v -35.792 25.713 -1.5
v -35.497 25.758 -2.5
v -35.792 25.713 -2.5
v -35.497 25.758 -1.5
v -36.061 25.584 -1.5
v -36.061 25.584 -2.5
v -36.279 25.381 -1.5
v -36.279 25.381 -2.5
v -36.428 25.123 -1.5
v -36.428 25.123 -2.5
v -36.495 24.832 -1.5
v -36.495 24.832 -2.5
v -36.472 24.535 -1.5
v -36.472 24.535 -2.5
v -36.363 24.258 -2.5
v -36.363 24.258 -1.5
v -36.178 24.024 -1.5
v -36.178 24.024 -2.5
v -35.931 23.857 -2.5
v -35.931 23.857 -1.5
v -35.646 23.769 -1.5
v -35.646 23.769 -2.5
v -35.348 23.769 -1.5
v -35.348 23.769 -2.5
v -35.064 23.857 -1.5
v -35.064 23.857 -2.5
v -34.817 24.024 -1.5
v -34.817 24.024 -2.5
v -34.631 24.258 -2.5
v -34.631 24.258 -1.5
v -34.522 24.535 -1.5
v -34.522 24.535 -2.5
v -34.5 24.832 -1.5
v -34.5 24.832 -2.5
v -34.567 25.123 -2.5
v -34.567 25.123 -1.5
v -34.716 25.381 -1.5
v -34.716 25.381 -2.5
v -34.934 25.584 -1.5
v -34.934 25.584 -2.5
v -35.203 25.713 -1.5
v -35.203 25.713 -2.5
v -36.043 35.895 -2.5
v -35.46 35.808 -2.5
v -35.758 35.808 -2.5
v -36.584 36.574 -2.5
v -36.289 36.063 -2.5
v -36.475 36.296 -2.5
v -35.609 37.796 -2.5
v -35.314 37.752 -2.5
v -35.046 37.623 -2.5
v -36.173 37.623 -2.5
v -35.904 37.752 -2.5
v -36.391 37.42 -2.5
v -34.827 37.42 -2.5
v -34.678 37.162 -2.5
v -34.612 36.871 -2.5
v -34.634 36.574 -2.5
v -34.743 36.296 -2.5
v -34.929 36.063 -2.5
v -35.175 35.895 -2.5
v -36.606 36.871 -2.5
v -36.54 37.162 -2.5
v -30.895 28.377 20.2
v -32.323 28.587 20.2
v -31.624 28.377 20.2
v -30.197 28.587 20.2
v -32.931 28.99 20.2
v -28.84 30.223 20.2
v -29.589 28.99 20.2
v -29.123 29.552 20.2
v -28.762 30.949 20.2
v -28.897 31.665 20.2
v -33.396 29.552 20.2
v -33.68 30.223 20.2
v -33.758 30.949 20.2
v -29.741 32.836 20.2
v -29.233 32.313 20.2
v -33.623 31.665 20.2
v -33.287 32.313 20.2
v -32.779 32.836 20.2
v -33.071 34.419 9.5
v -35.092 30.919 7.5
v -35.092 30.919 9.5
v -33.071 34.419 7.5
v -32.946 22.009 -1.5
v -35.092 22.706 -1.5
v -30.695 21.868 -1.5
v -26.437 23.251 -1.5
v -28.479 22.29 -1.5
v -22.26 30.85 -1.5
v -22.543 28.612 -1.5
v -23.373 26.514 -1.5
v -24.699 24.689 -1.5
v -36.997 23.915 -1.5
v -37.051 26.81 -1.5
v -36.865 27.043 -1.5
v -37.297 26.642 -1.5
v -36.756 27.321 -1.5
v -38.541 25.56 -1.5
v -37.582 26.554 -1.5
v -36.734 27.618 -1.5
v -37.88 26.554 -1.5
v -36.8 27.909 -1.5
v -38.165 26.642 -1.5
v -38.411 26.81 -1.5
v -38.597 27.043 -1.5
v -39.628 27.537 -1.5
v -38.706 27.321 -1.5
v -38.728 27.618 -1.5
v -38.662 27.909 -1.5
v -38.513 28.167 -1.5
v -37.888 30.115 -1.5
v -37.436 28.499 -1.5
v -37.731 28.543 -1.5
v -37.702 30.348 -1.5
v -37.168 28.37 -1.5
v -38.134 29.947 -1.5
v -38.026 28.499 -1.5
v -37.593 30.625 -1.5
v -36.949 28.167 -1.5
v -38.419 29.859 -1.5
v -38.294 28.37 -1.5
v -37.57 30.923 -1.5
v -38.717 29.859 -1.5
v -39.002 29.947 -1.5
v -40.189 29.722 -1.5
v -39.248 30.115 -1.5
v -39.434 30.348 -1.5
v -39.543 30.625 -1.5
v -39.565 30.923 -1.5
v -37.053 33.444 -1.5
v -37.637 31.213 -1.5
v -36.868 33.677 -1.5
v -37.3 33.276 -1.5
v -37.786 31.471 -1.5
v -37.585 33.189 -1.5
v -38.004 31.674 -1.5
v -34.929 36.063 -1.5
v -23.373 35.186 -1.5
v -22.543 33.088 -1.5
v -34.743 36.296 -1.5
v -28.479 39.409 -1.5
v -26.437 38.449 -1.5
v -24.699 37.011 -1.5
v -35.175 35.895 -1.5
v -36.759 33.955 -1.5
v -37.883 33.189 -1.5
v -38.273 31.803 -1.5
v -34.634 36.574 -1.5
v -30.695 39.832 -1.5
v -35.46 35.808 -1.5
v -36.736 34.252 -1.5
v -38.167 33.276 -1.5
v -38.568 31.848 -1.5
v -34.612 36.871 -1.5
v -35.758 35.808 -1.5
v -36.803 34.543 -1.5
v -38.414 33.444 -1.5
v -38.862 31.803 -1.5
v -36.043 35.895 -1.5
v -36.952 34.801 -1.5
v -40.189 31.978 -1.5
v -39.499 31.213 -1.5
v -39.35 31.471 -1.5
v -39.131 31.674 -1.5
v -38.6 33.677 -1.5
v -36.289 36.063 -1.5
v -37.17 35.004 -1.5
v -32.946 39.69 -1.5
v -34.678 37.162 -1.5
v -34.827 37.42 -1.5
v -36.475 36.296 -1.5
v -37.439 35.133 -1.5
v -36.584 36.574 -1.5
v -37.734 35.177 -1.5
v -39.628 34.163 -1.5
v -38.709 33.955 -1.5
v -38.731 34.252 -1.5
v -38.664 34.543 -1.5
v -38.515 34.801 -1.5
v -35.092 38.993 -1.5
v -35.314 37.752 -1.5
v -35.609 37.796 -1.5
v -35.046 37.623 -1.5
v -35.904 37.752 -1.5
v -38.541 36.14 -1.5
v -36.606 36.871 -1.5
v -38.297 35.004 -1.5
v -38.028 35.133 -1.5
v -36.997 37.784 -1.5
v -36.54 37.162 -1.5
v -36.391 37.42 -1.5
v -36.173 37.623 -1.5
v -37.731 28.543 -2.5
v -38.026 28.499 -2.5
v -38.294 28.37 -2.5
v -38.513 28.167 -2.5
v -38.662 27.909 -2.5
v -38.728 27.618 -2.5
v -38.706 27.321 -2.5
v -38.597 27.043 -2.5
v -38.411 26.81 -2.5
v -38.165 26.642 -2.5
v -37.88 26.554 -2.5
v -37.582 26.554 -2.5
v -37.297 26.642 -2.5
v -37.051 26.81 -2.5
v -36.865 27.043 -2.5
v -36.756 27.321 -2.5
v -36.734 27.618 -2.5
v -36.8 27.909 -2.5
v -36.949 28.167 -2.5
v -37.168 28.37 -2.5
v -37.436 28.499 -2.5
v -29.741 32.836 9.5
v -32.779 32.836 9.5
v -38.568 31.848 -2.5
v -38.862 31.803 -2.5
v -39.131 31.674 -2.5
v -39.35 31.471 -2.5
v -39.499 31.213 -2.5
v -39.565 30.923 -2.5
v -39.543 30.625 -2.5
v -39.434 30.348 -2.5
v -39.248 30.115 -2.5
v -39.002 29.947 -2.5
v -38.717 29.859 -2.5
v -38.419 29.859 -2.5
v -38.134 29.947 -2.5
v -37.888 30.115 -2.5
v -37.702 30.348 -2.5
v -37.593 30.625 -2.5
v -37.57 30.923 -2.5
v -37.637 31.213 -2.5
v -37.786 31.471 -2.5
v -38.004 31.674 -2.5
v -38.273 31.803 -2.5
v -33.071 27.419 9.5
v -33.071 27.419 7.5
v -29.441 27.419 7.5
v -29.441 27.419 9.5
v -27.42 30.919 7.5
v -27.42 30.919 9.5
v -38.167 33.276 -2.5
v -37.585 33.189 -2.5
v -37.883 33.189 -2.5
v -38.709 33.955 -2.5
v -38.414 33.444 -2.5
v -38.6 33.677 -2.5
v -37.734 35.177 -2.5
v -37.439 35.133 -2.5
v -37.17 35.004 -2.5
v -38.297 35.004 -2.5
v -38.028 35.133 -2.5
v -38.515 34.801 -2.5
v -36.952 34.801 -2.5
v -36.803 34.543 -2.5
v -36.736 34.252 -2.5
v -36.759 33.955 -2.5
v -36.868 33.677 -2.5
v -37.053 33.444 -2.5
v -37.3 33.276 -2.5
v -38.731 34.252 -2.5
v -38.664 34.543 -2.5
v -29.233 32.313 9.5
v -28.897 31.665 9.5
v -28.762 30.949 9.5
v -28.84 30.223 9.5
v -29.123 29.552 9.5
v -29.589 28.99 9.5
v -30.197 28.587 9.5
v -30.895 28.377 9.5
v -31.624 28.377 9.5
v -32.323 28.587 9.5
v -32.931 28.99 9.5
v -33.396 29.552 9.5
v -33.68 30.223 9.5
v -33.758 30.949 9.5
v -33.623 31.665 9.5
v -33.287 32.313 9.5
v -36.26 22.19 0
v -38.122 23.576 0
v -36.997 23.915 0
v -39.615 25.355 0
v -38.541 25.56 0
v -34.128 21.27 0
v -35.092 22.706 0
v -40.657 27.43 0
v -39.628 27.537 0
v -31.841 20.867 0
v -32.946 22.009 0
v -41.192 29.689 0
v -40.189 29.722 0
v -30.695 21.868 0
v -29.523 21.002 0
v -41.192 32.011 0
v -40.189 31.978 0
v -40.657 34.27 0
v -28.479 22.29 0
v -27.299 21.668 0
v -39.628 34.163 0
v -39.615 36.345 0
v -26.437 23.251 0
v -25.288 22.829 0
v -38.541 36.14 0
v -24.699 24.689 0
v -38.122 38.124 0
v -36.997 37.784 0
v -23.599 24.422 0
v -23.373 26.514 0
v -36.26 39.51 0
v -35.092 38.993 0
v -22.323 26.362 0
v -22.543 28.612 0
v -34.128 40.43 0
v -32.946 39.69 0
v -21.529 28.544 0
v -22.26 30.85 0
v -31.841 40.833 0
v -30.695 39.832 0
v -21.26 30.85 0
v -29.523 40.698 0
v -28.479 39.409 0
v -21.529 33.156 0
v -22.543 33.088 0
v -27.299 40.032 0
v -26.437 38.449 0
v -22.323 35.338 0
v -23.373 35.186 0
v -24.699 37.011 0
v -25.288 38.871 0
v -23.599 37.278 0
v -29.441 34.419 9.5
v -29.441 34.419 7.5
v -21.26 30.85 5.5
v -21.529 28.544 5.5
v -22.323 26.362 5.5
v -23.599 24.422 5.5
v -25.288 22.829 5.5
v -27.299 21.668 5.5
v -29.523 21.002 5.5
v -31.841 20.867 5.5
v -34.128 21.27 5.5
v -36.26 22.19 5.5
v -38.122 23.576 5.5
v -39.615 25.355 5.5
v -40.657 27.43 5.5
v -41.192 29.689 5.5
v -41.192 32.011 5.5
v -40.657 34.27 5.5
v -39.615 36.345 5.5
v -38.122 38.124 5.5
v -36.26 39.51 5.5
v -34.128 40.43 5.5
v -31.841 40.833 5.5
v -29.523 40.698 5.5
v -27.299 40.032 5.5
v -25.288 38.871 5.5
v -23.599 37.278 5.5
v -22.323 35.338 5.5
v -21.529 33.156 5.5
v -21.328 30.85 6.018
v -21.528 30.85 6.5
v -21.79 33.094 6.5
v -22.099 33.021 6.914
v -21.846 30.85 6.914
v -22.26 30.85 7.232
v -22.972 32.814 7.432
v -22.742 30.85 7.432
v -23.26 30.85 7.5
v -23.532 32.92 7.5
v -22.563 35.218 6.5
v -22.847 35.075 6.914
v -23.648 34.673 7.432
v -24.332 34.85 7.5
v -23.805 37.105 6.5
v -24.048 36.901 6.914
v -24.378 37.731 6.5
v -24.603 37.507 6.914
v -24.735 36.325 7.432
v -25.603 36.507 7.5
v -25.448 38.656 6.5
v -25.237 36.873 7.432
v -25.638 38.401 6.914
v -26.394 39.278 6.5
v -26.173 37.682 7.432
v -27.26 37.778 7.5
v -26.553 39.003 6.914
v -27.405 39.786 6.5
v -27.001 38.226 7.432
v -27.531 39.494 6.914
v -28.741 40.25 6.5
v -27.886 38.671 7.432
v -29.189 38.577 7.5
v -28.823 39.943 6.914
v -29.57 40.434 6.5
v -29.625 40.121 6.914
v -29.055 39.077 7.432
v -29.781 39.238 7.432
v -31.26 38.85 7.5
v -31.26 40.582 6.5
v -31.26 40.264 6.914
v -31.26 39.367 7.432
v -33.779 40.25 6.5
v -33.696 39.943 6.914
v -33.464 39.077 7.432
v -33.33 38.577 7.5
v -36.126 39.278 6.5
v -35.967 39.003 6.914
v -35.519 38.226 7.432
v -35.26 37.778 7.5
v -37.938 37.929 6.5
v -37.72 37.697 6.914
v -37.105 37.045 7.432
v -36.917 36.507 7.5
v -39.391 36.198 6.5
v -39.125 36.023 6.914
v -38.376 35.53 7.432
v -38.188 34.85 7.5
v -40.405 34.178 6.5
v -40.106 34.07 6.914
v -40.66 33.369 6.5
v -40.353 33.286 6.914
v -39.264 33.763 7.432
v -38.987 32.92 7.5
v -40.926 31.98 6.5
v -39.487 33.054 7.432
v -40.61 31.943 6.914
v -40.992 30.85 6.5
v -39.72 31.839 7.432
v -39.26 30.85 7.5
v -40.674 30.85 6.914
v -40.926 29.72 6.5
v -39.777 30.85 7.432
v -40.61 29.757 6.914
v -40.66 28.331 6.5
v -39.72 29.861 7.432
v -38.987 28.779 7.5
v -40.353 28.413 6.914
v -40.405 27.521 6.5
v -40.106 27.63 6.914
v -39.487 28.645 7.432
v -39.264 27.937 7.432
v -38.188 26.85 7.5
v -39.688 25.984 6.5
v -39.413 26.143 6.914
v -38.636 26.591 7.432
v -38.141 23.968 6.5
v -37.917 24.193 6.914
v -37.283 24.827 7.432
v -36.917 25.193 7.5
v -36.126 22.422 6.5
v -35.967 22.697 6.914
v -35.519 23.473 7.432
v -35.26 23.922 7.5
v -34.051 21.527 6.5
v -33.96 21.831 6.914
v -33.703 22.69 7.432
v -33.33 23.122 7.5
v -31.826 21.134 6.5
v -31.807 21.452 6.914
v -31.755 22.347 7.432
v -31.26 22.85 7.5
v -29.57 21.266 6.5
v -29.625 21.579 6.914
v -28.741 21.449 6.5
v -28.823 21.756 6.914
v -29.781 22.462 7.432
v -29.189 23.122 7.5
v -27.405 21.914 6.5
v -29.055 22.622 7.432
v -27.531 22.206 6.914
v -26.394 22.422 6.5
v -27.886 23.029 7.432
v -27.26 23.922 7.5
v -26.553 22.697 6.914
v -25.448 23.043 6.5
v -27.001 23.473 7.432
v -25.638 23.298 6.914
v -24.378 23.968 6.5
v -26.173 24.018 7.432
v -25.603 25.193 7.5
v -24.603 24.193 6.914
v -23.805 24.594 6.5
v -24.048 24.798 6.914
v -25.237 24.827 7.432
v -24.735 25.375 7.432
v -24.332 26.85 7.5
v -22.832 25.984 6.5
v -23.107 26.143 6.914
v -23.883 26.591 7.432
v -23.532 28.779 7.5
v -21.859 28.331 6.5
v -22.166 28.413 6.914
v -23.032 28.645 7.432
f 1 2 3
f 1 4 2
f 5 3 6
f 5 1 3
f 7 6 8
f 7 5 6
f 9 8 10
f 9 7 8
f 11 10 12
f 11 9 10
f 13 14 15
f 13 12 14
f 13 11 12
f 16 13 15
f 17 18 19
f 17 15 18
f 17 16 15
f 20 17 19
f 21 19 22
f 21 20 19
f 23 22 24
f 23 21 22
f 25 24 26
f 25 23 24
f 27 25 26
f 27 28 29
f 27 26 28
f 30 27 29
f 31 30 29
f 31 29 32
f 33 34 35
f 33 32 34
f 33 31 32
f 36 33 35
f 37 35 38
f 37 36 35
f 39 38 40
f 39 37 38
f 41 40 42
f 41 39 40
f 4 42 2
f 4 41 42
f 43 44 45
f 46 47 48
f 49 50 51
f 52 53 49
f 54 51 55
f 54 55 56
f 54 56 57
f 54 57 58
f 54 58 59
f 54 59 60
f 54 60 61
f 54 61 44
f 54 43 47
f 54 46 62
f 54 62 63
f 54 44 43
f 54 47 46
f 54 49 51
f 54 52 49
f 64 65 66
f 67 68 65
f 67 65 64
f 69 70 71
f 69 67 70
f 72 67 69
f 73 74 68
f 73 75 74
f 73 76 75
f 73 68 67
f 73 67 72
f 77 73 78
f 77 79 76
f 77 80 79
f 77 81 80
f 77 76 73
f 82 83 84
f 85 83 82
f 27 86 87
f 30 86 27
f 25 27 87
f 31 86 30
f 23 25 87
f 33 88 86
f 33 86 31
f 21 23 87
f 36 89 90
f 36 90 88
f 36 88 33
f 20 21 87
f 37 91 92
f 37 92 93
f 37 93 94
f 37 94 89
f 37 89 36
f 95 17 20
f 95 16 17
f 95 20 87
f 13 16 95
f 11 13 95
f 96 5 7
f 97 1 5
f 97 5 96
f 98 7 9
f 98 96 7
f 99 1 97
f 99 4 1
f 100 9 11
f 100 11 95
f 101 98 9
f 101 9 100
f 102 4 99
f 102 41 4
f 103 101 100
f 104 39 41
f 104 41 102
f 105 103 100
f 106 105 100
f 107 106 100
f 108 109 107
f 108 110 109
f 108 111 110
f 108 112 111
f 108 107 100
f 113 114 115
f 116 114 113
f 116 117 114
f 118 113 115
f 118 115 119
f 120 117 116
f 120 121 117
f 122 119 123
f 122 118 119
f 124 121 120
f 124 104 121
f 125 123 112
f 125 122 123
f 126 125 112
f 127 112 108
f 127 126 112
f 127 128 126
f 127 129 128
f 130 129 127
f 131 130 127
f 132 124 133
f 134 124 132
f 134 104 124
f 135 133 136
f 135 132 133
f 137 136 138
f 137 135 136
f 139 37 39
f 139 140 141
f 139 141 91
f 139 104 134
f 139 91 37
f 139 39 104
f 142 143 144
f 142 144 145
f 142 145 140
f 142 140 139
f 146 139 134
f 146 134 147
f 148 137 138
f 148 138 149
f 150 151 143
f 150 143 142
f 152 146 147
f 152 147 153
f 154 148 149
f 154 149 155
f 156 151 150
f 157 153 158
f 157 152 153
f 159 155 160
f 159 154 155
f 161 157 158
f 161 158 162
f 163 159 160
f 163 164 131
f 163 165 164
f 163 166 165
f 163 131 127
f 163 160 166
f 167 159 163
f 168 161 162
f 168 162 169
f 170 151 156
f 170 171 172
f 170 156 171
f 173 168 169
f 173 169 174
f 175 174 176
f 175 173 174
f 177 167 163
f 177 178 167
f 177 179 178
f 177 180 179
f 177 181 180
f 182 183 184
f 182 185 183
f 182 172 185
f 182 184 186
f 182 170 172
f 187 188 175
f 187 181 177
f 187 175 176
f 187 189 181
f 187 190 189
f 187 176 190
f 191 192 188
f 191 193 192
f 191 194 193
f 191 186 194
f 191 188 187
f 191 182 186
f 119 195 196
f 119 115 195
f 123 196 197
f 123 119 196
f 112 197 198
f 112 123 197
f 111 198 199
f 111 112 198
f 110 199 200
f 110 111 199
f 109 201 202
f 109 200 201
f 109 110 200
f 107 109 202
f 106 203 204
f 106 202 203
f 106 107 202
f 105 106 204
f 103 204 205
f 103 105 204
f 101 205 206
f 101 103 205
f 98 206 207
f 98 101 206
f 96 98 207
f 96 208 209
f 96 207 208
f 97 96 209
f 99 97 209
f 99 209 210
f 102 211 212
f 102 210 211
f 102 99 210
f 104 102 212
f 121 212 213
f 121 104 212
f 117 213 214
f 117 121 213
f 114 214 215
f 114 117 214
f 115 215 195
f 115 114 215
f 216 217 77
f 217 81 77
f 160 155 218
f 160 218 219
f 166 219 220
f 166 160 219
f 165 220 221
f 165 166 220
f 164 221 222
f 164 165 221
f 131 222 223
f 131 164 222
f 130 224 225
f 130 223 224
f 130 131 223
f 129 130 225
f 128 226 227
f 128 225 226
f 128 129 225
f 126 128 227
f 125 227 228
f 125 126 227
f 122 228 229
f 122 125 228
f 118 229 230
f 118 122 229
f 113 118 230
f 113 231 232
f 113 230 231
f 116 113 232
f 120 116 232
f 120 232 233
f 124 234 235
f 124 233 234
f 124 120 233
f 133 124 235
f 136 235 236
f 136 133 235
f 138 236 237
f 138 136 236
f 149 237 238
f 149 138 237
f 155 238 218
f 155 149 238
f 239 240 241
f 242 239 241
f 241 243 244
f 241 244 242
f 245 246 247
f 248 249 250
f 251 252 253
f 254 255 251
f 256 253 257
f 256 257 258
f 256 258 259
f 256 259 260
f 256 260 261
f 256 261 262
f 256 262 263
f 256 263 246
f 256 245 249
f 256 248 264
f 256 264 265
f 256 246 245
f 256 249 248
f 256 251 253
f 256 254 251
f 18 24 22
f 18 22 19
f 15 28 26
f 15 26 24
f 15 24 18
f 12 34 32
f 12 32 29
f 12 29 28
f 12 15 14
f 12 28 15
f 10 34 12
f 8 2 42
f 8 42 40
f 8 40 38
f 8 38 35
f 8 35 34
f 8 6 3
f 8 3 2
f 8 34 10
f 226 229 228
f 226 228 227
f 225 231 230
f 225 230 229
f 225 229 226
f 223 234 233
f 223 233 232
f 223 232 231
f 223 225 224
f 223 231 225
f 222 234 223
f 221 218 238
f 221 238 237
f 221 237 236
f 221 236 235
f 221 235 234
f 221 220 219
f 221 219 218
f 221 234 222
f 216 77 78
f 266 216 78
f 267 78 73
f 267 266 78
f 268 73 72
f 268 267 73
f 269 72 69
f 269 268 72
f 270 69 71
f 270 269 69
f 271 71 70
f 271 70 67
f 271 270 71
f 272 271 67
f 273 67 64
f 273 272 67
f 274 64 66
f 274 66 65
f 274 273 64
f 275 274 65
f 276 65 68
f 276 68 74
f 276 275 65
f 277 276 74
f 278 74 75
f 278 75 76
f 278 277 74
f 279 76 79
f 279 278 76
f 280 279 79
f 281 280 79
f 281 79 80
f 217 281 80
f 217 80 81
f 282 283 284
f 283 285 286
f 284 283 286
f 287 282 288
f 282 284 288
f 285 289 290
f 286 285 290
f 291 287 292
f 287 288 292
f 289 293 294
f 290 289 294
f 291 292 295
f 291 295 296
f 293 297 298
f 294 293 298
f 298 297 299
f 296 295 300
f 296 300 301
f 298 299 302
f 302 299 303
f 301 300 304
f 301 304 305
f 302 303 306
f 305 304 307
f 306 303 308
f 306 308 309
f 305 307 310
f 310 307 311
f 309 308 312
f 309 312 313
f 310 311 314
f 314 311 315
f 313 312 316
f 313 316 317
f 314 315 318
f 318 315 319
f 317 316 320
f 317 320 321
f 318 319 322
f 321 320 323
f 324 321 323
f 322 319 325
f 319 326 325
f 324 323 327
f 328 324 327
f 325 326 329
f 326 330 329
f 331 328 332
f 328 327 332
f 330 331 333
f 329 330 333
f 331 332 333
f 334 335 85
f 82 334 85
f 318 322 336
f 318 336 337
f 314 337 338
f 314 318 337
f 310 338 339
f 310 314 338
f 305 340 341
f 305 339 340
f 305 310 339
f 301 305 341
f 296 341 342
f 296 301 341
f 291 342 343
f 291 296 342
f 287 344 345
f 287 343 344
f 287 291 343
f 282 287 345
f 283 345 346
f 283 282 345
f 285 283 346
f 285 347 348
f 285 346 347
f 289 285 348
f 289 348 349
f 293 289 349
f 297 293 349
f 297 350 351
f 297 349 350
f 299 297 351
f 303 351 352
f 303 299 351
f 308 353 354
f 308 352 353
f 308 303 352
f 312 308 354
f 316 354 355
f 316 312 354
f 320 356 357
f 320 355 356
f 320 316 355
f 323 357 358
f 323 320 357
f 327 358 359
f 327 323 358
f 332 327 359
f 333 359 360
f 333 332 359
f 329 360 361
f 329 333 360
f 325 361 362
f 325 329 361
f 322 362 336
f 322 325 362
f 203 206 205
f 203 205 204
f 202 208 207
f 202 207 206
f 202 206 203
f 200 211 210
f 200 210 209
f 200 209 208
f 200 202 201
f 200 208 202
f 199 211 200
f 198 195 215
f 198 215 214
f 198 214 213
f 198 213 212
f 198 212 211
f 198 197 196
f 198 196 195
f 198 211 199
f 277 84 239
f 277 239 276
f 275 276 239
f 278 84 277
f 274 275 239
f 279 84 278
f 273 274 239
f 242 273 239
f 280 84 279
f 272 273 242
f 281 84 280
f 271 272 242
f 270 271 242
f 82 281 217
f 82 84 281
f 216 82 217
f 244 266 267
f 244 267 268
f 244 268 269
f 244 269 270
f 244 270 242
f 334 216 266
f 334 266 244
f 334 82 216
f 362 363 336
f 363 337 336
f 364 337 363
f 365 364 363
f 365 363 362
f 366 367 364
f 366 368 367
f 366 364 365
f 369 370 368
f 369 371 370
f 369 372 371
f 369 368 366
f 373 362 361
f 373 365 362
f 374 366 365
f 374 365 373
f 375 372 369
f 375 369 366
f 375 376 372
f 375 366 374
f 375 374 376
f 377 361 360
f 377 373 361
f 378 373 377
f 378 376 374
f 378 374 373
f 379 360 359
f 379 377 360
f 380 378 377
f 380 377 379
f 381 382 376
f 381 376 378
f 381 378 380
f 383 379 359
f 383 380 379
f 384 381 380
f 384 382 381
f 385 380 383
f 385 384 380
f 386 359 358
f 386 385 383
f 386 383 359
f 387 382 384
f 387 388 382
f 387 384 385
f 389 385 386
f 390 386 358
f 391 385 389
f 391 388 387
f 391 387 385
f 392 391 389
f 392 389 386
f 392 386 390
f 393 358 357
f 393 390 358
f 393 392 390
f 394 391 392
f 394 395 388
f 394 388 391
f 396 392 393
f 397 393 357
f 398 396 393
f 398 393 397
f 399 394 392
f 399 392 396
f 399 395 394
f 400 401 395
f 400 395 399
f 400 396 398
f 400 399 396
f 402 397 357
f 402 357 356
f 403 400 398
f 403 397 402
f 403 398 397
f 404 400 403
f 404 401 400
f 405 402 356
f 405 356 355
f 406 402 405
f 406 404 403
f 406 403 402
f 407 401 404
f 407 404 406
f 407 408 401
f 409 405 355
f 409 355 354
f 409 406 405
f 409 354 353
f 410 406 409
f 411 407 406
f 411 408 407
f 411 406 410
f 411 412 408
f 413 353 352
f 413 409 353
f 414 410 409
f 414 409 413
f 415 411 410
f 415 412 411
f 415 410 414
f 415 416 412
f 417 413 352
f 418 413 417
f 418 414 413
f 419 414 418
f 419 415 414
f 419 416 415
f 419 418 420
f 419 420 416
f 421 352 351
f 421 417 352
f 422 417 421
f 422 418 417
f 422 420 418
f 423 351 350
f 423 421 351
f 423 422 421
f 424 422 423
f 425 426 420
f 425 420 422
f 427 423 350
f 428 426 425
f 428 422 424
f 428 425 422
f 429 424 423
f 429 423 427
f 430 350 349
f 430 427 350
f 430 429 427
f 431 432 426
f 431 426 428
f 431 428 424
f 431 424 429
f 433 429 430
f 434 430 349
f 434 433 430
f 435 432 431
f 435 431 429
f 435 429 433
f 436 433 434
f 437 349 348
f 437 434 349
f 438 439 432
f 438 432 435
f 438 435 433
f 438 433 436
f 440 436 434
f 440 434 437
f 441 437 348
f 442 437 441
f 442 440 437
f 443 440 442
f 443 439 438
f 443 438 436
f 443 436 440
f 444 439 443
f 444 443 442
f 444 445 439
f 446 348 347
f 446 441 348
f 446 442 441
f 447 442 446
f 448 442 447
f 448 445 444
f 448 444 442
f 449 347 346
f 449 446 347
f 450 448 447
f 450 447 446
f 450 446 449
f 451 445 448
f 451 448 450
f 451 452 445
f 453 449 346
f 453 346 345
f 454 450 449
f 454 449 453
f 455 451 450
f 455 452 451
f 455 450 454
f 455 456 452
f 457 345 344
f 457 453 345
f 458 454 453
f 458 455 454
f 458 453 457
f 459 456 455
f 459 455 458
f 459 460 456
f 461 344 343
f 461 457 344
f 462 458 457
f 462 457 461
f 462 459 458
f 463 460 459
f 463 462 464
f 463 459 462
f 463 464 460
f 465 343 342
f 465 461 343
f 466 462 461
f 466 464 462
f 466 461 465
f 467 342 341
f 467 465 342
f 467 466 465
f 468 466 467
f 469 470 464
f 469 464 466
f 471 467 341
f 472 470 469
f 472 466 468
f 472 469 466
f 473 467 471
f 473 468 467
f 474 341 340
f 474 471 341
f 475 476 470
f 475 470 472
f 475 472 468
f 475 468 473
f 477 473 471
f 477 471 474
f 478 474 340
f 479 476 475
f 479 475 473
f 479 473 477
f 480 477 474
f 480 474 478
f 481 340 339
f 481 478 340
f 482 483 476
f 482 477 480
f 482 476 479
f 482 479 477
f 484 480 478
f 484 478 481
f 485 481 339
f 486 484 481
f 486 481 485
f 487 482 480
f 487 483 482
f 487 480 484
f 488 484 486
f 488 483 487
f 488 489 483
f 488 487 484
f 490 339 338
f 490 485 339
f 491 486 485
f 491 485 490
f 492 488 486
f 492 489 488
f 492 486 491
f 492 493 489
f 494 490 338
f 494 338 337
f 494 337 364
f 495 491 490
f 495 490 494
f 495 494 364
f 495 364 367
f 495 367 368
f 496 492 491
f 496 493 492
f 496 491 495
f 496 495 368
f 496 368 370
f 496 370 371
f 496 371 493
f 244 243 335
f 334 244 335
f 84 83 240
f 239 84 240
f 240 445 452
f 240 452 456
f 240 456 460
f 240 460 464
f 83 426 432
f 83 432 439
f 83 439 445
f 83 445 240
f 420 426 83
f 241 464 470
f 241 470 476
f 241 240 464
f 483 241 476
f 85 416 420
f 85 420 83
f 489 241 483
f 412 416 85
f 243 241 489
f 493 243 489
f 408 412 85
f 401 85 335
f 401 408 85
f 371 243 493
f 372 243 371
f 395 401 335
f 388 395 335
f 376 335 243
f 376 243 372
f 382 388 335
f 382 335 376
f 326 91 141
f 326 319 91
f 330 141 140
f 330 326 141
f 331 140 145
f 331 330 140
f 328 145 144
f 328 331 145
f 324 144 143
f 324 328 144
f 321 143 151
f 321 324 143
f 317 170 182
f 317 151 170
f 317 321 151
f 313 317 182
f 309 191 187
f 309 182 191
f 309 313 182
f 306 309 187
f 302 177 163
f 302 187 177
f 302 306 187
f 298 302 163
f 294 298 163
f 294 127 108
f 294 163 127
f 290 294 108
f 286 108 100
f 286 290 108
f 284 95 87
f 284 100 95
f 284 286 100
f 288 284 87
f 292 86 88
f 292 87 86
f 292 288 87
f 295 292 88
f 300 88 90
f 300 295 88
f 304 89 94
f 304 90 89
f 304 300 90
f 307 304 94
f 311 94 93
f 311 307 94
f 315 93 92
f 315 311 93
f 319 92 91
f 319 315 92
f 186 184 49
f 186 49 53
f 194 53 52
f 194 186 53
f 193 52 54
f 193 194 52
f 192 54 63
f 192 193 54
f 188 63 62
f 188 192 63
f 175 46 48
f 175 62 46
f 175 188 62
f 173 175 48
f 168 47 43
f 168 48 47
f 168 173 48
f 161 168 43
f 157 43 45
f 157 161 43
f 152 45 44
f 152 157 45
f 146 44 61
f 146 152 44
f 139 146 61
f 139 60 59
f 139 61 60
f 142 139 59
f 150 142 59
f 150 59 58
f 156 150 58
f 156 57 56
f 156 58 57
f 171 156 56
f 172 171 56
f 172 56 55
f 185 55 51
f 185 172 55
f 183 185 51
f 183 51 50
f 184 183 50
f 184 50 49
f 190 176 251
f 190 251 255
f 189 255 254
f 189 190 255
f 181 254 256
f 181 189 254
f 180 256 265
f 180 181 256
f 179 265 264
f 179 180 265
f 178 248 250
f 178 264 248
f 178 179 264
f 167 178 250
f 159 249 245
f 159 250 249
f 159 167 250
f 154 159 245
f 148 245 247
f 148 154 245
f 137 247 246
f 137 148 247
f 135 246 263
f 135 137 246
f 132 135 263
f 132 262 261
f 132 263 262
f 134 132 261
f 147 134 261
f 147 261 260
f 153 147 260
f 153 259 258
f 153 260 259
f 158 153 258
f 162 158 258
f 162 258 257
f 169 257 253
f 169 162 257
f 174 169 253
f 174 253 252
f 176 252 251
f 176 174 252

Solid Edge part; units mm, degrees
sketch "Sketch1" plane through (0, 0, 0) normal (0, 0, 1) x (1, 0, 0)
  circle A0 centre (-31.2598, 30.8498) radius 10
  dimension "D1" = 20
extrude "Protrusion1" add sketch "Sketch1" along normal blind 7.5
fillet "Round_1" radius 2 1 edges at (-41.2598, 30.8498, 7.5)
sketch "Sketch2" plane through (-31.2598, 30.8498, 0) normal (0, 0, -1) x (1, 0, 0)
  circle A0 centre (0, 0) radius 9
extrude "ExtrudedProtrusion_2" add sketch "Sketch2" along normal blind 1.5
sketch "Sketch3" plane through (-31.2598, 30.8498, 7.5) normal (0, 0, 1) x (1, 0, 0)
  circle A0 centre (0, 0) radius 2.5
  dimension "D1" = 5
extrude "ExtrudedProtrusion_3" add sketch "Sketch3" along normal blind 12.7
sketch "Sketch4" plane through (-31.2598, 30.8498, 7.5) normal (0, 0, 1) x (1, 0, 0)
  line L0 (1.819, 3.5694) -> (-1.811, 3.5694)
  line L1 (-3.8317, 0.0694) -> (-1.811, 3.5694)
  line L2 (-3.8317, 0.0694) -> (-1.811, -3.4306)
  line L3 (-1.811, -3.4306) -> (1.819, -3.4306)
  line L4 (3.8397, 0.0694) -> (1.819, -3.4306)
  line L5 (3.8397, 0.0694) -> (1.819, 3.5694)
extrude "ExtrudedProtrusion_4" add sketch "Sketch4" along normal blind 2
sketch "Sketch5" plane through (-31.2598, 30.8498, -1.5) normal (0, 0, -1) x (0, 1, 0)
  circle A0 centre (-3.3065, -6.4712) radius 1
  circle A1 centre (3.3276, -6.4738) radius 1
  circle A2 centre (-6.0923, -4.2376) radius 1
  circle A3 centre (5.9466, -4.3494) radius 1
  circle A4 centre (-0.002, -7.3079) radius 1
  dimension "D1" = 2
  dimension "D2" = 2
  dimension "D3" = 2
  dimension "D4" = 2
  dimension "D5" = 2
extrude "ExtrudedProtrusion_5" add sketch "Sketch5" along normal blind 1
sketch "Sketch6" plane through (-31.2598, 30.8498, 20.2) normal (0, 0, 1) x (1, 0, 0)
  line L0 (-1.6783, 1.9858) -> (1.6783, 1.9858)
extrude "Cutout1" cut sketch "Sketch6" against normal up to vertex (10.7 mm away) material side at (-31.2598, 32.8856, 20.2)
